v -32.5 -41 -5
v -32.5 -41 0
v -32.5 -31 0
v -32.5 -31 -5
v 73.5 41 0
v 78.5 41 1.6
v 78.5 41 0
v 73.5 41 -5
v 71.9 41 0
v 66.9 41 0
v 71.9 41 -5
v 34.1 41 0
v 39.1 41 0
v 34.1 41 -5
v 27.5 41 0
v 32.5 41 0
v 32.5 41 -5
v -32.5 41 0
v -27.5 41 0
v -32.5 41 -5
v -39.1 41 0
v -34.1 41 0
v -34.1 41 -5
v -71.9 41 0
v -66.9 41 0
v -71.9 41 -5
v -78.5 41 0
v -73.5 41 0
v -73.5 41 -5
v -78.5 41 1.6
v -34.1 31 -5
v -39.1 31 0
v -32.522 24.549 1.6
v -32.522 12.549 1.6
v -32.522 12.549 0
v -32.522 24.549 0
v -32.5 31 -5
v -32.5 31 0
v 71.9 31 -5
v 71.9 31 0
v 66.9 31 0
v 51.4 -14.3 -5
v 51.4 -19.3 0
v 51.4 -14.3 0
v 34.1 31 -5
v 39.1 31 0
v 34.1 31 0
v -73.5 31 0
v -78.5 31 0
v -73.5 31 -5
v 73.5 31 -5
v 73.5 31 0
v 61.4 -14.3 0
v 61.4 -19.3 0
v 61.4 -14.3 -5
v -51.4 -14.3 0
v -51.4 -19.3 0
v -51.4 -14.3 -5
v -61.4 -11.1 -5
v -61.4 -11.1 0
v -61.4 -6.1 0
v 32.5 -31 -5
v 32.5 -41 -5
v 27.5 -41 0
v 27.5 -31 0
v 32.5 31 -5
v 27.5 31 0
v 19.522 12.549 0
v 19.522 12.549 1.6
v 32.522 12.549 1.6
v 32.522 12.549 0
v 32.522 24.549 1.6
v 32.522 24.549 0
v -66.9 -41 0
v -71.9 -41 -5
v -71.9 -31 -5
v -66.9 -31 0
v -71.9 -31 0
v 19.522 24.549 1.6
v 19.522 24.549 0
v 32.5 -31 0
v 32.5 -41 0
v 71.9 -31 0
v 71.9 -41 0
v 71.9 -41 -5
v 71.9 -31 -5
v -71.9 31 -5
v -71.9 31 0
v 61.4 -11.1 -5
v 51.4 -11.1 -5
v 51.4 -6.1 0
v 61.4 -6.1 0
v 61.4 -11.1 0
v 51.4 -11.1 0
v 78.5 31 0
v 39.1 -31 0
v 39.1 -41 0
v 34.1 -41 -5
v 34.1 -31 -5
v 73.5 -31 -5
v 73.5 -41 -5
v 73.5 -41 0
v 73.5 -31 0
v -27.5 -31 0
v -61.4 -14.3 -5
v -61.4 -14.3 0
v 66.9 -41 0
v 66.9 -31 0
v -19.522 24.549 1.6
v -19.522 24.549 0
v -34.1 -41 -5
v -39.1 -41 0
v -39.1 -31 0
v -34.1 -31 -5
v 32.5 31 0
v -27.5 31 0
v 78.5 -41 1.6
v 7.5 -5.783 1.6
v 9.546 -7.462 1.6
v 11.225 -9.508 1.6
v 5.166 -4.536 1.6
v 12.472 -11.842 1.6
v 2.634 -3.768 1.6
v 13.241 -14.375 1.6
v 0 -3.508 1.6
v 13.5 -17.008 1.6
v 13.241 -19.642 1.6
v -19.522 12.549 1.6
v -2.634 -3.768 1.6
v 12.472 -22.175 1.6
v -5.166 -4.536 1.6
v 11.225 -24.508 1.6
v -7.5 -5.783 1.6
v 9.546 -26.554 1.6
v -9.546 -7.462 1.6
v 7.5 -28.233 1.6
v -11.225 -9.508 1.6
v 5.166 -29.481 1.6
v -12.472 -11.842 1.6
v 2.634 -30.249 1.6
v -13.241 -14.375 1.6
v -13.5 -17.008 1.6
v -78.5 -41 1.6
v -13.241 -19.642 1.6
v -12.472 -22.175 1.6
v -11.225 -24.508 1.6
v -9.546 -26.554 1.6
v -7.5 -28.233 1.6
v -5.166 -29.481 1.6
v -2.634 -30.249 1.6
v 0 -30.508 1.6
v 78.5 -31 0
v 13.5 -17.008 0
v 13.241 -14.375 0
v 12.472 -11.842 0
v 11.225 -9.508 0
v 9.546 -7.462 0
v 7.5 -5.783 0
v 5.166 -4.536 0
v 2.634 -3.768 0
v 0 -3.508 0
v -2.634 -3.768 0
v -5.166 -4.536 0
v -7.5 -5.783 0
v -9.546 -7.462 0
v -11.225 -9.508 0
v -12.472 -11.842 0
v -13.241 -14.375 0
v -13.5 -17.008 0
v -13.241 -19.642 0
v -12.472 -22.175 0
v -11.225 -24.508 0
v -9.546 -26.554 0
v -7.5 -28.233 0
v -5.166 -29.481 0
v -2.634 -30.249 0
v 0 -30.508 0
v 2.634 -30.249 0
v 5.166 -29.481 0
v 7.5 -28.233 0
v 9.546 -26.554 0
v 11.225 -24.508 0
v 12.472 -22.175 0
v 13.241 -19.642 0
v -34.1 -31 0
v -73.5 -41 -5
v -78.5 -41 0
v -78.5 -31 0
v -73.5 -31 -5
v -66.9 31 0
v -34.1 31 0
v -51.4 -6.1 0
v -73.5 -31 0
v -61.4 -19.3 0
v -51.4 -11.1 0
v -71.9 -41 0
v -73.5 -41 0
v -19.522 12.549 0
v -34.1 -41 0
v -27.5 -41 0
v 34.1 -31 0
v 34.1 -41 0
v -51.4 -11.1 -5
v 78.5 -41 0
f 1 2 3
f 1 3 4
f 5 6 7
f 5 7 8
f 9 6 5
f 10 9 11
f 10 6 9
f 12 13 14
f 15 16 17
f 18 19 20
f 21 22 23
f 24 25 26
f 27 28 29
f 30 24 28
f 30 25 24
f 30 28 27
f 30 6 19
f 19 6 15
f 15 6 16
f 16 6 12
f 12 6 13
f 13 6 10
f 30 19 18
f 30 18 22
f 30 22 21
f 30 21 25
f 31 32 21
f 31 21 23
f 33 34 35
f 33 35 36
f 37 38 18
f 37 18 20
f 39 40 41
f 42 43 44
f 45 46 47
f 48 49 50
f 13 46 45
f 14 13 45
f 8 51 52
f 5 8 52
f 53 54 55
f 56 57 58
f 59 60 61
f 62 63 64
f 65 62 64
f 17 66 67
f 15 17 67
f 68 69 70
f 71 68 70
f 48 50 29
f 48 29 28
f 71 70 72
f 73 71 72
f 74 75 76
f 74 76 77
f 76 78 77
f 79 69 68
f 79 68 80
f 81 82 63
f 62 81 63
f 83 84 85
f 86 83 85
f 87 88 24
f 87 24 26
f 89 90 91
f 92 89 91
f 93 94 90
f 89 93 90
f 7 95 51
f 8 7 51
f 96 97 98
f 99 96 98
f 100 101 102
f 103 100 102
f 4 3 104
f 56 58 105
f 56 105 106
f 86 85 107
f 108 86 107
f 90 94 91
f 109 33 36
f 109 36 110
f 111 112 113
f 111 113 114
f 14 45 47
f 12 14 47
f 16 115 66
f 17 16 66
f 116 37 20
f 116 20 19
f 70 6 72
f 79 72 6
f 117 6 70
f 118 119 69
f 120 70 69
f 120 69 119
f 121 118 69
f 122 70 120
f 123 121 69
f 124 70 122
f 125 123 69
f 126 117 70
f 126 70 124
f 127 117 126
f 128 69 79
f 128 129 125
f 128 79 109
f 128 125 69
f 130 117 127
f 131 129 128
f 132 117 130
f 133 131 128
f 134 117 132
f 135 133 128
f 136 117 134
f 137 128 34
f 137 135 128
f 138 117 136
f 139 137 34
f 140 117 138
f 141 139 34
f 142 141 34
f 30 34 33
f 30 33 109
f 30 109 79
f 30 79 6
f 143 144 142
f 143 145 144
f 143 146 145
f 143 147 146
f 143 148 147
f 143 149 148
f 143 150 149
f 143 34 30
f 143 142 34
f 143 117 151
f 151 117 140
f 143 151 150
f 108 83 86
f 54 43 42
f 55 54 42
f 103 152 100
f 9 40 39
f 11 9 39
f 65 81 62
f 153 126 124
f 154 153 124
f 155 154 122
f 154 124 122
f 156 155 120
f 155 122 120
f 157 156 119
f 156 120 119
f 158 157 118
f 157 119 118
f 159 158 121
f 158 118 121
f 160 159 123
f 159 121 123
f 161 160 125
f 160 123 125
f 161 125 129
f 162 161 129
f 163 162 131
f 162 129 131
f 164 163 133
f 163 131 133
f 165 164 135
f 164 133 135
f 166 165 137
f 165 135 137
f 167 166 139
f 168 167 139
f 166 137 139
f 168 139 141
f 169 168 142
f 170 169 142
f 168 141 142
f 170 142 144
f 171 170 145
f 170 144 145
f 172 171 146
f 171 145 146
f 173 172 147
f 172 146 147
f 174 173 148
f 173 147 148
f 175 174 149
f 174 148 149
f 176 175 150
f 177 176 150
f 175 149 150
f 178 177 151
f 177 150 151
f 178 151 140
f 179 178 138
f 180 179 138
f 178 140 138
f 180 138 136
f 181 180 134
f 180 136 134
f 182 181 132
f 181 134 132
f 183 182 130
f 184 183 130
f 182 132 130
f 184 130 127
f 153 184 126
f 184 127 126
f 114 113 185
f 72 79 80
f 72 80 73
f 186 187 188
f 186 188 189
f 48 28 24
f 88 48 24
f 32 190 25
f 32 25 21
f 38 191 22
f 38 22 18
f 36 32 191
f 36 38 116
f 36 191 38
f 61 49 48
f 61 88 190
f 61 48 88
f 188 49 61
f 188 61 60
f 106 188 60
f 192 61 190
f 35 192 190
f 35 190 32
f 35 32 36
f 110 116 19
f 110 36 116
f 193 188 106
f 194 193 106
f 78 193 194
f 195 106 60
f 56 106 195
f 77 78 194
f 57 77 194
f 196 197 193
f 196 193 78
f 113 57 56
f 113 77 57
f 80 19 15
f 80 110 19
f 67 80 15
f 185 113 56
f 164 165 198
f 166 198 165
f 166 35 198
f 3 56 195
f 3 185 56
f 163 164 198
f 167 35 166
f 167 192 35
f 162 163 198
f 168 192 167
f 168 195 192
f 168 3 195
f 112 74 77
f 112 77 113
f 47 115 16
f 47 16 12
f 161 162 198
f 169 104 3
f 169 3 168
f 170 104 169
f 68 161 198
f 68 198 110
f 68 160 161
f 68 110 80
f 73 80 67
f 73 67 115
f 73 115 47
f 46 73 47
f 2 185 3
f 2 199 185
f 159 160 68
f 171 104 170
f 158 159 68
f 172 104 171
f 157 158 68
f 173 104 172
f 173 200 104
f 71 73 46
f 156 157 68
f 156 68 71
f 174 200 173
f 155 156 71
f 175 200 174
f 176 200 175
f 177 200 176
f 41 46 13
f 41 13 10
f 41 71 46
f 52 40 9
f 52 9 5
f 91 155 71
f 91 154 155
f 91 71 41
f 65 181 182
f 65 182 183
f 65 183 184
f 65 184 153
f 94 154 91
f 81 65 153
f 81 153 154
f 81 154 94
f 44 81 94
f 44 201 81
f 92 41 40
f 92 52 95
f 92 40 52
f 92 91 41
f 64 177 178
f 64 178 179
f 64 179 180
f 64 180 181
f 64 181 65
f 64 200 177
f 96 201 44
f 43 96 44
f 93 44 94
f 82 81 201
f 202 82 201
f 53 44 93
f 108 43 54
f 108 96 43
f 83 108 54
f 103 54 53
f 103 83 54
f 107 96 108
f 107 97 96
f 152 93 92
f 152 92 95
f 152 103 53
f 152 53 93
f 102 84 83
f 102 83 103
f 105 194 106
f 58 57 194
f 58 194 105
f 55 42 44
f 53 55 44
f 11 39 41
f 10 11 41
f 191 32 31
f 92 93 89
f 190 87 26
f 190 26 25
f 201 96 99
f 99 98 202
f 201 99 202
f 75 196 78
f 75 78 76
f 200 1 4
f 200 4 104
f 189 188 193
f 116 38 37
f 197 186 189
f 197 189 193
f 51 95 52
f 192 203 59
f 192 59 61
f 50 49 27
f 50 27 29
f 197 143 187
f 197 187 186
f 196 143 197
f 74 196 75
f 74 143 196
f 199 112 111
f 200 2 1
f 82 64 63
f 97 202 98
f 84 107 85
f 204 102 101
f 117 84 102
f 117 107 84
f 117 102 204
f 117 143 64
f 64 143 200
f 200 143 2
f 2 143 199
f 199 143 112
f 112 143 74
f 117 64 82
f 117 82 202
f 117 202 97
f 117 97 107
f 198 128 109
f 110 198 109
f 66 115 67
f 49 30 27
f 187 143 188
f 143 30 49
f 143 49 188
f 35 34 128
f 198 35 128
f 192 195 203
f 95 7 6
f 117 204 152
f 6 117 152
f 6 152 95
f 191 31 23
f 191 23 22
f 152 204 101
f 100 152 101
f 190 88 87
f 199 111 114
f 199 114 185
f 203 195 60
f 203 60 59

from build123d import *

# Parameters (mm, degrees)
F2_DEPTH  = 82
F3_DEPTH  = 10
F4_START  = -72
F4_DEPTH  = 10
F7_DEPTH  = 10
F8_START  = 102.8
F8_DEPTH  = 10
F10_R     = 13.5
F11_DEPTH = 1.6
F12_W     = 13
F12_H     = 12
F13_DEPTH = 1.6


# Not quite as in the source:
# - a feature names something its author has since deleted; it is built from what else it names


with BuildPart() as f2:
    # F1 (on offset) → F2 (new body)
    with BuildSketch(Plane.XZ.offset(41)):
        Polygon((78.5, 0), (78.5, 1.6), (-78.5, 1.6), (-78.5, 0), (-73.5, 0), (-71.9, 0), (-66.9, 0), (-39.1, 0), (-34.1, 0), (-32.5, 0), (-27.5, 0), (27.5, 0), (32.5, 0), (34.1, 0), (39.1, 0), (66.9, 0), (71.9, 0), (73.5, 0), align=None)
    extrude(amount=-F2_DEPTH)

    # F1 (on offset) → F3 (join)
    with BuildSketch(Plane.XZ.offset(41)):
        Polygon((-66.9, 0), (-71.9, 0), (-71.9, -5), align=None)
        Polygon((-34.1, 0), (-39.1, 0), (-34.1, -5), align=None)
        Polygon((-27.5, 0), (-32.5, 0), (-32.5, -5), align=None)
        Polygon((-73.5, 0), (-78.5, 0), (-73.5, -5), align=None)
    extrude(amount=-F3_DEPTH)

    # F1 (on offset) → F4 (join)
    with BuildSketch(Plane.XZ.offset(41).offset(F4_START)):
        Polygon((-66.9, 0), (-71.9, 0), (-71.9, -5), align=None)
        Polygon((-34.1, 0), (-39.1, 0), (-34.1, -5), align=None)
        Polygon((-27.5, 0), (-32.5, 0), (-32.5, -5), align=None)
        Polygon((-73.5, 0), (-78.5, 0), (-73.5, -5), align=None)
    extrude(amount=-F4_DEPTH)

    # F6 (on offset) → F7 (join)
    with BuildSketch(Plane.YZ.offset(-51.4)):
        Polygon((-11.1, 0), (-11.1, -5), (-6.1, 0), align=None)
        Polygon((-14.3, -5), (-14.3, 0), (-19.3, 0), align=None)
    extrude(amount=-F7_DEPTH)

    # F6 (on offset) → F8 (join)
    with BuildSketch(Plane.YZ.offset(-51.4).offset(F8_START)):
        Polygon((-11.1, 0), (-11.1, -5), (-6.1, 0), align=None)
        Polygon((-14.3, -5), (-14.3, 0), (-19.3, 0), align=None)
    extrude(amount=F8_DEPTH)

    # F9: F2 across plane


with BuildPart() as f2_1:
    add(f2.part)
    add(f2.part.mirror(Plane.YZ))

    # F10 (on face) → F11 (cut)
    with BuildSketch(Plane.XY.offset(1.6)):
        with Locations((0, -17.0082943066)):
            Circle(F10_R)
    extrude(amount=-F11_DEPTH, mode=Mode.SUBTRACT)

    # F12 (on face) → F13 (cut)
    with BuildSketch(Plane.XY.offset(1.6)):
        with Locations((-26.0217403993, 18.549364836)):
            Rectangle(F12_W, F12_H)
        with Locations((26.0217403993, 18.549364836)):
            Rectangle(F12_W, F12_H)
    extrude(amount=-F13_DEPTH, mode=Mode.SUBTRACT)


solid = f2_1.part
